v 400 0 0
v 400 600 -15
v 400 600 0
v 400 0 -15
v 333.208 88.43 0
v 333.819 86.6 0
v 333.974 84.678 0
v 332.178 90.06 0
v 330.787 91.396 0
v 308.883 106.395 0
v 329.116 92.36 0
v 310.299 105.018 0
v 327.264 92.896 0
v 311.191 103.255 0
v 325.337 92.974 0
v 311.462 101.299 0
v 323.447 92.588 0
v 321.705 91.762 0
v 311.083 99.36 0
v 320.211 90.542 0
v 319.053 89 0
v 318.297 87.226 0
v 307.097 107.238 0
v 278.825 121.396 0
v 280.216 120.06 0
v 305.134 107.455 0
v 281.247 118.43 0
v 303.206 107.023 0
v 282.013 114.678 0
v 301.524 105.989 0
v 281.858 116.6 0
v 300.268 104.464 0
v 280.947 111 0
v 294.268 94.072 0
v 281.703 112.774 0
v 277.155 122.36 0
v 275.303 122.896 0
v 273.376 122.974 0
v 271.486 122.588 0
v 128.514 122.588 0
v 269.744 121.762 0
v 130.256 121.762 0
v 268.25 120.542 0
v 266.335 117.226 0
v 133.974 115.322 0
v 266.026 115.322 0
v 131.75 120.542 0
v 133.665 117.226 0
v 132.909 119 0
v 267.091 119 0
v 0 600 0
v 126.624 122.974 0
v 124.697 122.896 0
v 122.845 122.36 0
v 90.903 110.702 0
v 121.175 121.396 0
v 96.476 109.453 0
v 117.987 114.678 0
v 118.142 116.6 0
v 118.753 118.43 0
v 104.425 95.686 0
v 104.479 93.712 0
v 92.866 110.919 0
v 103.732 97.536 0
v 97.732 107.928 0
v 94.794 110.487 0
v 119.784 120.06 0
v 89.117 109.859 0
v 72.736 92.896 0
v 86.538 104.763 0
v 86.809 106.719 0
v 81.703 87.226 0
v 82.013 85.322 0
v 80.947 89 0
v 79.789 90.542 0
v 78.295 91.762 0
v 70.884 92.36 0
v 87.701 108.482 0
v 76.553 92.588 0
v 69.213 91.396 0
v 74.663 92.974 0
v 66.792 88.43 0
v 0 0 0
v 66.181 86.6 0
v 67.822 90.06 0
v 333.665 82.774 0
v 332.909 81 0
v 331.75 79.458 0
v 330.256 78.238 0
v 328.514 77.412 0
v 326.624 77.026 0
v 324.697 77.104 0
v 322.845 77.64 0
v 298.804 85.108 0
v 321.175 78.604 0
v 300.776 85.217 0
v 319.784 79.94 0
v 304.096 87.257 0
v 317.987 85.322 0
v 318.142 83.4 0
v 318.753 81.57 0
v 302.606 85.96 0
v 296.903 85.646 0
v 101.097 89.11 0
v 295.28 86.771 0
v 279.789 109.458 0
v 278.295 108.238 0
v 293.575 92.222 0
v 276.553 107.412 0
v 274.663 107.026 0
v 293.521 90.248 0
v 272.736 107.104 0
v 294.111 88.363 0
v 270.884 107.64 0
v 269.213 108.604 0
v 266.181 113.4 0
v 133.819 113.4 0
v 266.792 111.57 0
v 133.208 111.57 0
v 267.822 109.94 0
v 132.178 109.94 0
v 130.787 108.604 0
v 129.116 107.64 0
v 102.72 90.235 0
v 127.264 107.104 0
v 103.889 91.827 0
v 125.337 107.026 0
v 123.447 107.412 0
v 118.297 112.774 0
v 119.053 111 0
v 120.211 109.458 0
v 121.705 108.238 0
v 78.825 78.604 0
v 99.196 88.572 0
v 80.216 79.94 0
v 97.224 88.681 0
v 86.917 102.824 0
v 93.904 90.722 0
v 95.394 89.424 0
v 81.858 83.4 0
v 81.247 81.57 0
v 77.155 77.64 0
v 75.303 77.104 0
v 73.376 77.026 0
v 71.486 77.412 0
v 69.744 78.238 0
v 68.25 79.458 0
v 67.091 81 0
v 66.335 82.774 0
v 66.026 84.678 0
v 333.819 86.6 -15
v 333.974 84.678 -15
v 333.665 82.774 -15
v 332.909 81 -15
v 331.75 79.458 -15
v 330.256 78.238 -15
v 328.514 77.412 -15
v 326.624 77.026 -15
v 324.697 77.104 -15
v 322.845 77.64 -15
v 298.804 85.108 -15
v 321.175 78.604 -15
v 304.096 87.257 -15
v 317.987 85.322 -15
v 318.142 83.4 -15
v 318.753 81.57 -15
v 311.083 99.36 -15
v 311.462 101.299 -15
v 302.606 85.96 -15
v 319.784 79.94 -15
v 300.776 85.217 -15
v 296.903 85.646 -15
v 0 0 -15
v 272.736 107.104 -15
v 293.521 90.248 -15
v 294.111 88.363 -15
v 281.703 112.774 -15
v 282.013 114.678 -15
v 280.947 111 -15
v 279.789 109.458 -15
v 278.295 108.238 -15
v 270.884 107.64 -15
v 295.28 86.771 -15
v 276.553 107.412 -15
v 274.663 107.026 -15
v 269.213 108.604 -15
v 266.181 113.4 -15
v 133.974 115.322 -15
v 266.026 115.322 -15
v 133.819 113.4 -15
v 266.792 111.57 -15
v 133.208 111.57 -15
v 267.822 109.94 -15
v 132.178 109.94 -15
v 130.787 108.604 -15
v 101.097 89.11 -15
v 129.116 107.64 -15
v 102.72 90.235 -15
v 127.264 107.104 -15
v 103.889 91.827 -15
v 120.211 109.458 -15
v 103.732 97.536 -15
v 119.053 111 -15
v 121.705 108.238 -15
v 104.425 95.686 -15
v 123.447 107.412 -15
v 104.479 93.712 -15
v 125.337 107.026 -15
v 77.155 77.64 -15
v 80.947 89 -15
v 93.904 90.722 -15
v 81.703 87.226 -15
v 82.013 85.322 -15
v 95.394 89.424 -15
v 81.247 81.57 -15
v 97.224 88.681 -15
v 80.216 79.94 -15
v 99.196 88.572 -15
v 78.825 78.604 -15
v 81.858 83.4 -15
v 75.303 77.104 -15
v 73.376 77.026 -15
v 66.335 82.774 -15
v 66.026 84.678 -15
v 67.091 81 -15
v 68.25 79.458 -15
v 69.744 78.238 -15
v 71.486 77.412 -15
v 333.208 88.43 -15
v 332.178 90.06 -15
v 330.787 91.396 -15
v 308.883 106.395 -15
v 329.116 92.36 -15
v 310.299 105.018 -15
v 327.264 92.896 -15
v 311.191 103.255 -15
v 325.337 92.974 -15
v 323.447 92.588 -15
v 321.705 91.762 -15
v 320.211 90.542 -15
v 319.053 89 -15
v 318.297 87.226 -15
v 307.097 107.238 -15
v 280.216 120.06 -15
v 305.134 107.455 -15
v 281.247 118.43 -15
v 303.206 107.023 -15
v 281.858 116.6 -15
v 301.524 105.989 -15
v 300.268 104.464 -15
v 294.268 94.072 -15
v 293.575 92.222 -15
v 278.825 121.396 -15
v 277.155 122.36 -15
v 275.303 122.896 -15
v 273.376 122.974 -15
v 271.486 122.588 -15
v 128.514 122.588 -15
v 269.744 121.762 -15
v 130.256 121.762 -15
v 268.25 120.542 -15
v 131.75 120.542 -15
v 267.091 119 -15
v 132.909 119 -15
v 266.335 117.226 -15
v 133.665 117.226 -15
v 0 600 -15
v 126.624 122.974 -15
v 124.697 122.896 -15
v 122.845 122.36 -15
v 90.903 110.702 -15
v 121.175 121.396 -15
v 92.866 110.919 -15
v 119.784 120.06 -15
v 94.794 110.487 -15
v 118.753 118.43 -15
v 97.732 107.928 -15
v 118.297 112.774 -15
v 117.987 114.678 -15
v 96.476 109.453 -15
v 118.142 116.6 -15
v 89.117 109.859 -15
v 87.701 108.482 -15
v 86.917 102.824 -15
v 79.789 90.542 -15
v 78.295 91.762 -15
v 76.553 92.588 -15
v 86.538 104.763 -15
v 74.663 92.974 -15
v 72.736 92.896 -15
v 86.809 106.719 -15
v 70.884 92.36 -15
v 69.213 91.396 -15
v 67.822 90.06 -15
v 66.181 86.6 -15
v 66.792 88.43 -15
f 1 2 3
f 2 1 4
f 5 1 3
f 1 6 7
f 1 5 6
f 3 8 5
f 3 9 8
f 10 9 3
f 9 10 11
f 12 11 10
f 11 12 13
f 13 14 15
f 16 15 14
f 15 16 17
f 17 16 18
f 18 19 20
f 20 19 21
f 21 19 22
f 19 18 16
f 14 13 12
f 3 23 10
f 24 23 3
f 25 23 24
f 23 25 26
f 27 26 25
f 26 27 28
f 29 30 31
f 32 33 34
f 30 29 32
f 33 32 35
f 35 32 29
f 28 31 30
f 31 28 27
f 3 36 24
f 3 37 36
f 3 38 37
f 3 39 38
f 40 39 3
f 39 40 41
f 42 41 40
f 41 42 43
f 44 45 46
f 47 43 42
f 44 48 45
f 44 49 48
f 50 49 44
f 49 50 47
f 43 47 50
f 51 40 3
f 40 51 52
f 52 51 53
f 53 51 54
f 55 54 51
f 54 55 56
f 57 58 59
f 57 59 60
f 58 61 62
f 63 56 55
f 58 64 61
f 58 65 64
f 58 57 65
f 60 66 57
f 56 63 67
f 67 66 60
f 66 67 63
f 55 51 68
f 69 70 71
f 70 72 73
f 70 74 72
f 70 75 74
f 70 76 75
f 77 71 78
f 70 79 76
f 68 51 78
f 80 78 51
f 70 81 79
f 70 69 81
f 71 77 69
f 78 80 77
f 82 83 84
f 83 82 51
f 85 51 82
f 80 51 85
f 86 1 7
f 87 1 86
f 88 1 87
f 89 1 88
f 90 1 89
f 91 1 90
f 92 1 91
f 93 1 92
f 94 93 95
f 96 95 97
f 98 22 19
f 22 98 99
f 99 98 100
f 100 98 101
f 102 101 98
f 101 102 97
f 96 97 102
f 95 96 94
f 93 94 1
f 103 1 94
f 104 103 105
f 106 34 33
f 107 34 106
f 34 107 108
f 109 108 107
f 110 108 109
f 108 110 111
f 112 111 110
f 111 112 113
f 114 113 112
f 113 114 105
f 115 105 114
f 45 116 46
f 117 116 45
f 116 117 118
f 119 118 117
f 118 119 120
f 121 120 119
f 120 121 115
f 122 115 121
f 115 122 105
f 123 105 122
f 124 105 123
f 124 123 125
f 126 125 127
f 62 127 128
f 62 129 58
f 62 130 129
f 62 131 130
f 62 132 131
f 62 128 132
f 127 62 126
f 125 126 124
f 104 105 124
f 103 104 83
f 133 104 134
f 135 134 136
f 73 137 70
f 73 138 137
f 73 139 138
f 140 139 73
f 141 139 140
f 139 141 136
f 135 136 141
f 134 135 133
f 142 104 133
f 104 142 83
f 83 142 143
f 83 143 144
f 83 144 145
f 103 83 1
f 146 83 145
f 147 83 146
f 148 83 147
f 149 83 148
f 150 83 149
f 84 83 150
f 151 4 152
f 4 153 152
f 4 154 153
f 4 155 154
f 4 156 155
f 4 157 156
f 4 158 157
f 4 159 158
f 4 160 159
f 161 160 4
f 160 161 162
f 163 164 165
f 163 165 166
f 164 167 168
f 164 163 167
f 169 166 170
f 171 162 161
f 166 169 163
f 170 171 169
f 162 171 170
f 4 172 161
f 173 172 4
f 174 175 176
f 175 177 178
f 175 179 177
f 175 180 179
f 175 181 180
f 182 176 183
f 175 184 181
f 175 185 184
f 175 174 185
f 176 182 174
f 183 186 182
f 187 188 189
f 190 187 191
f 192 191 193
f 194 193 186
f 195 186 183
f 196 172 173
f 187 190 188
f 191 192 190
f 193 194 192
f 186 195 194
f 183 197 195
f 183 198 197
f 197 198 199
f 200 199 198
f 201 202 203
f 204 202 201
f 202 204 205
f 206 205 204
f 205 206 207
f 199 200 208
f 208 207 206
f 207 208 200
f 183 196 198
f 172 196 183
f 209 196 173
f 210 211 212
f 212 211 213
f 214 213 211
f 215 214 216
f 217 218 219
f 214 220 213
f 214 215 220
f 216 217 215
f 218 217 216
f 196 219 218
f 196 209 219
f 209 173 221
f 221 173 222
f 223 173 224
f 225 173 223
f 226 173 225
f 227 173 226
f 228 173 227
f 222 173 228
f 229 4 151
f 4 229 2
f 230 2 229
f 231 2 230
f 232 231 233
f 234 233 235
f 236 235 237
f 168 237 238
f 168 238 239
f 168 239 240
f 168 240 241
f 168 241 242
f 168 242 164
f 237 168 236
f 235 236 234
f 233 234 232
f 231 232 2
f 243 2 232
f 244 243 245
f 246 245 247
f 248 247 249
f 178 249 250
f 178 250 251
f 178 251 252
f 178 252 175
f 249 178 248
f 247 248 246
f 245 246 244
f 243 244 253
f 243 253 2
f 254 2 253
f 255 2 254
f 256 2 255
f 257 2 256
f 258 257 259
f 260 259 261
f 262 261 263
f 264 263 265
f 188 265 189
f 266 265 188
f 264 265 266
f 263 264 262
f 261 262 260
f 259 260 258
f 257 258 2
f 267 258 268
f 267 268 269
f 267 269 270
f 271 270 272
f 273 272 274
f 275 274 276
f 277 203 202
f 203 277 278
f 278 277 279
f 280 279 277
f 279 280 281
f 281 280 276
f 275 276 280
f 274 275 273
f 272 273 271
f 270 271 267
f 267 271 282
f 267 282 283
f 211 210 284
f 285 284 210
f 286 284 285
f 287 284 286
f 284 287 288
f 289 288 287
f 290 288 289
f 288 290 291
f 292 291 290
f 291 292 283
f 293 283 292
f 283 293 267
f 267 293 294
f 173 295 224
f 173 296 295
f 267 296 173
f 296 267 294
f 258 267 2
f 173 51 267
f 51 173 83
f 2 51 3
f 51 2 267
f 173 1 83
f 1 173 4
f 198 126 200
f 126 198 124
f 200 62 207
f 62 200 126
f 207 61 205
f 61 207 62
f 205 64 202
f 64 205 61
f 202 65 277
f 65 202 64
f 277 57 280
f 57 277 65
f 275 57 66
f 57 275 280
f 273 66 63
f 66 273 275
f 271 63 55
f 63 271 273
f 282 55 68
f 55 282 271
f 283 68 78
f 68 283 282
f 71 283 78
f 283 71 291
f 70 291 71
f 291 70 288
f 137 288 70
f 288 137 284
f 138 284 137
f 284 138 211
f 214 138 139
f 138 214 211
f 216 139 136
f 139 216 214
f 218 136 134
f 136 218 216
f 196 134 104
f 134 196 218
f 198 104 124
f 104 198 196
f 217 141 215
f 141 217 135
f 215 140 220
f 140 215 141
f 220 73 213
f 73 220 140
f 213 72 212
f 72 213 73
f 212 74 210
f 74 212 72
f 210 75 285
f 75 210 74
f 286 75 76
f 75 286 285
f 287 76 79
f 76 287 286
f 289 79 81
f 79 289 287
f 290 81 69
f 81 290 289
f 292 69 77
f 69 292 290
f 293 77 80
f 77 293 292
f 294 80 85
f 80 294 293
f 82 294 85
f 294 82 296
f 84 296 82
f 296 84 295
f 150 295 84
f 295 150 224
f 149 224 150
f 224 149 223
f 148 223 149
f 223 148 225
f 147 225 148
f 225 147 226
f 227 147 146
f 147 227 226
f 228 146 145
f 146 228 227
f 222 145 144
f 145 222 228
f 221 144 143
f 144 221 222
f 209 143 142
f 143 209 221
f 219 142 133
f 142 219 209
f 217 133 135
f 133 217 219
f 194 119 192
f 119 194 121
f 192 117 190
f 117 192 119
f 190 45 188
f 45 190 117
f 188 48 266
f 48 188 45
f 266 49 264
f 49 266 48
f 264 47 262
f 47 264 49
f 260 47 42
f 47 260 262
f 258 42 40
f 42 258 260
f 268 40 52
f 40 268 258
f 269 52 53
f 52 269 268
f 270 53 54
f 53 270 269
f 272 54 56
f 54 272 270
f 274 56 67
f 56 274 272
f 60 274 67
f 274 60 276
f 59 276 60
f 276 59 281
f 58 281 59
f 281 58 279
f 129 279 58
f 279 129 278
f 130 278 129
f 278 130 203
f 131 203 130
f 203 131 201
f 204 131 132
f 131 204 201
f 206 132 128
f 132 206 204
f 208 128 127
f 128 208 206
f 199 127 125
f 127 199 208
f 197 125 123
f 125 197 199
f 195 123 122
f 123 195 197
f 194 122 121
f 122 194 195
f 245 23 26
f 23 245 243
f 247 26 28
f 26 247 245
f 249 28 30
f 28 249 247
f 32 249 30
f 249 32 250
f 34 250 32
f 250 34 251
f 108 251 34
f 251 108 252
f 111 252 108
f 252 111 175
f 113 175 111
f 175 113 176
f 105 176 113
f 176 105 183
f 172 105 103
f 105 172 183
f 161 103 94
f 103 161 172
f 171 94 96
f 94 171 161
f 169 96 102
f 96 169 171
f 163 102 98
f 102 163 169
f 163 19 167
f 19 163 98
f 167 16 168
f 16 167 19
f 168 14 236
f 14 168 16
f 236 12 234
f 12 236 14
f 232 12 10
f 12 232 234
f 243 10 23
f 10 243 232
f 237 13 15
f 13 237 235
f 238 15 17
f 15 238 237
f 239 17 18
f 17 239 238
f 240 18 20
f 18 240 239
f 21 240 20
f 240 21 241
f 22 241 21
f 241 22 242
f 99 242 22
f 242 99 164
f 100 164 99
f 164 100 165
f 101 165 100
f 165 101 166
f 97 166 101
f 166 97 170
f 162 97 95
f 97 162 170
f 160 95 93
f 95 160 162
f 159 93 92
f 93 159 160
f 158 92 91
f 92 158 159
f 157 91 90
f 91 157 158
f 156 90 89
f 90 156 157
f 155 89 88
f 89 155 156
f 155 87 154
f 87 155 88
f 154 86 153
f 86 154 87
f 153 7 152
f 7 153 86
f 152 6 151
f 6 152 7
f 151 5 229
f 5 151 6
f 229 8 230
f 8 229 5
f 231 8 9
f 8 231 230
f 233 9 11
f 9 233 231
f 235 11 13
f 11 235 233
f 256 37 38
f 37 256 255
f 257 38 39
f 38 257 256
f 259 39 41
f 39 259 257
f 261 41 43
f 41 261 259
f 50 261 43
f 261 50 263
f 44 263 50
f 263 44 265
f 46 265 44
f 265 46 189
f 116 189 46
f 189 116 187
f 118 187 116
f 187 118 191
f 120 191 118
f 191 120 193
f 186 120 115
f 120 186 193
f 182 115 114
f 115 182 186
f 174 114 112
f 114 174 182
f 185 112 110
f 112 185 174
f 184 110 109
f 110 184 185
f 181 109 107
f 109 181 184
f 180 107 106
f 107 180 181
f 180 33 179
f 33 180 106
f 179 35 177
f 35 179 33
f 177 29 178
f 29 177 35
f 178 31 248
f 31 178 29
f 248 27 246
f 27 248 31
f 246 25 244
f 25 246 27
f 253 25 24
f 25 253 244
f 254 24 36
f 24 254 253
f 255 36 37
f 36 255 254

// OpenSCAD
union() {
	union() {
		difference() {
			difference() {
				translate(v = [0, 0, -15]) {
					cube(size = [400, 600, 15]);
				}
				translate(v = [100, 100]) {
					rotate(a = [0, 0, 0]) {
						translate(v = [0, 0, -16]) {
							linear_extrude(height = 17) {
								rotate(a = [0, 0, 30]) {
									translate(v = [-30, 0]) {
										circle(r = 8);
									}
									translate(v = [-4, 0]) {
										hull() {
											translate(v = [0, -4]) {
												circle(r = 6);
											}
											translate(v = [0, 8]) {
												circle(r = 6);
											}
										}
									}
									translate(v = [30, 0]) {
										circle(r = 8);
									}
								}
							}
						}
					}
				}
			}
			translate(v = [300, 100]) {
				rotate(a = [0, 0, 0]) {
					translate(v = [0, 0, -16]) {
						linear_extrude(height = 17) {
							rotate(a = [0, 0, 150]) {
								translate(v = [-30, 0]) {
									circle(r = 8);
								}
								translate(v = [-4, 0]) {
									hull() {
										translate(v = [0, -4]) {
											circle(r = 6);
										}
										translate(v = [0, 8]) {
											circle(r = 6);
										}
									}
								}
								translate(v = [30, 0]) {
									circle(r = 8);
								}
							}
						}
					}
				}
			}
		}
		translate(v = [100, 100]) {
			rotate(a = [0, 0, 0]) {
				cube(size = [0, 0, 0]);
			}
		}
	}
	translate(v = [300, 100]) {
		rotate(a = [0, 0, 0]) {
			cube(size = [0, 0, 0]);
		}
	}
}
